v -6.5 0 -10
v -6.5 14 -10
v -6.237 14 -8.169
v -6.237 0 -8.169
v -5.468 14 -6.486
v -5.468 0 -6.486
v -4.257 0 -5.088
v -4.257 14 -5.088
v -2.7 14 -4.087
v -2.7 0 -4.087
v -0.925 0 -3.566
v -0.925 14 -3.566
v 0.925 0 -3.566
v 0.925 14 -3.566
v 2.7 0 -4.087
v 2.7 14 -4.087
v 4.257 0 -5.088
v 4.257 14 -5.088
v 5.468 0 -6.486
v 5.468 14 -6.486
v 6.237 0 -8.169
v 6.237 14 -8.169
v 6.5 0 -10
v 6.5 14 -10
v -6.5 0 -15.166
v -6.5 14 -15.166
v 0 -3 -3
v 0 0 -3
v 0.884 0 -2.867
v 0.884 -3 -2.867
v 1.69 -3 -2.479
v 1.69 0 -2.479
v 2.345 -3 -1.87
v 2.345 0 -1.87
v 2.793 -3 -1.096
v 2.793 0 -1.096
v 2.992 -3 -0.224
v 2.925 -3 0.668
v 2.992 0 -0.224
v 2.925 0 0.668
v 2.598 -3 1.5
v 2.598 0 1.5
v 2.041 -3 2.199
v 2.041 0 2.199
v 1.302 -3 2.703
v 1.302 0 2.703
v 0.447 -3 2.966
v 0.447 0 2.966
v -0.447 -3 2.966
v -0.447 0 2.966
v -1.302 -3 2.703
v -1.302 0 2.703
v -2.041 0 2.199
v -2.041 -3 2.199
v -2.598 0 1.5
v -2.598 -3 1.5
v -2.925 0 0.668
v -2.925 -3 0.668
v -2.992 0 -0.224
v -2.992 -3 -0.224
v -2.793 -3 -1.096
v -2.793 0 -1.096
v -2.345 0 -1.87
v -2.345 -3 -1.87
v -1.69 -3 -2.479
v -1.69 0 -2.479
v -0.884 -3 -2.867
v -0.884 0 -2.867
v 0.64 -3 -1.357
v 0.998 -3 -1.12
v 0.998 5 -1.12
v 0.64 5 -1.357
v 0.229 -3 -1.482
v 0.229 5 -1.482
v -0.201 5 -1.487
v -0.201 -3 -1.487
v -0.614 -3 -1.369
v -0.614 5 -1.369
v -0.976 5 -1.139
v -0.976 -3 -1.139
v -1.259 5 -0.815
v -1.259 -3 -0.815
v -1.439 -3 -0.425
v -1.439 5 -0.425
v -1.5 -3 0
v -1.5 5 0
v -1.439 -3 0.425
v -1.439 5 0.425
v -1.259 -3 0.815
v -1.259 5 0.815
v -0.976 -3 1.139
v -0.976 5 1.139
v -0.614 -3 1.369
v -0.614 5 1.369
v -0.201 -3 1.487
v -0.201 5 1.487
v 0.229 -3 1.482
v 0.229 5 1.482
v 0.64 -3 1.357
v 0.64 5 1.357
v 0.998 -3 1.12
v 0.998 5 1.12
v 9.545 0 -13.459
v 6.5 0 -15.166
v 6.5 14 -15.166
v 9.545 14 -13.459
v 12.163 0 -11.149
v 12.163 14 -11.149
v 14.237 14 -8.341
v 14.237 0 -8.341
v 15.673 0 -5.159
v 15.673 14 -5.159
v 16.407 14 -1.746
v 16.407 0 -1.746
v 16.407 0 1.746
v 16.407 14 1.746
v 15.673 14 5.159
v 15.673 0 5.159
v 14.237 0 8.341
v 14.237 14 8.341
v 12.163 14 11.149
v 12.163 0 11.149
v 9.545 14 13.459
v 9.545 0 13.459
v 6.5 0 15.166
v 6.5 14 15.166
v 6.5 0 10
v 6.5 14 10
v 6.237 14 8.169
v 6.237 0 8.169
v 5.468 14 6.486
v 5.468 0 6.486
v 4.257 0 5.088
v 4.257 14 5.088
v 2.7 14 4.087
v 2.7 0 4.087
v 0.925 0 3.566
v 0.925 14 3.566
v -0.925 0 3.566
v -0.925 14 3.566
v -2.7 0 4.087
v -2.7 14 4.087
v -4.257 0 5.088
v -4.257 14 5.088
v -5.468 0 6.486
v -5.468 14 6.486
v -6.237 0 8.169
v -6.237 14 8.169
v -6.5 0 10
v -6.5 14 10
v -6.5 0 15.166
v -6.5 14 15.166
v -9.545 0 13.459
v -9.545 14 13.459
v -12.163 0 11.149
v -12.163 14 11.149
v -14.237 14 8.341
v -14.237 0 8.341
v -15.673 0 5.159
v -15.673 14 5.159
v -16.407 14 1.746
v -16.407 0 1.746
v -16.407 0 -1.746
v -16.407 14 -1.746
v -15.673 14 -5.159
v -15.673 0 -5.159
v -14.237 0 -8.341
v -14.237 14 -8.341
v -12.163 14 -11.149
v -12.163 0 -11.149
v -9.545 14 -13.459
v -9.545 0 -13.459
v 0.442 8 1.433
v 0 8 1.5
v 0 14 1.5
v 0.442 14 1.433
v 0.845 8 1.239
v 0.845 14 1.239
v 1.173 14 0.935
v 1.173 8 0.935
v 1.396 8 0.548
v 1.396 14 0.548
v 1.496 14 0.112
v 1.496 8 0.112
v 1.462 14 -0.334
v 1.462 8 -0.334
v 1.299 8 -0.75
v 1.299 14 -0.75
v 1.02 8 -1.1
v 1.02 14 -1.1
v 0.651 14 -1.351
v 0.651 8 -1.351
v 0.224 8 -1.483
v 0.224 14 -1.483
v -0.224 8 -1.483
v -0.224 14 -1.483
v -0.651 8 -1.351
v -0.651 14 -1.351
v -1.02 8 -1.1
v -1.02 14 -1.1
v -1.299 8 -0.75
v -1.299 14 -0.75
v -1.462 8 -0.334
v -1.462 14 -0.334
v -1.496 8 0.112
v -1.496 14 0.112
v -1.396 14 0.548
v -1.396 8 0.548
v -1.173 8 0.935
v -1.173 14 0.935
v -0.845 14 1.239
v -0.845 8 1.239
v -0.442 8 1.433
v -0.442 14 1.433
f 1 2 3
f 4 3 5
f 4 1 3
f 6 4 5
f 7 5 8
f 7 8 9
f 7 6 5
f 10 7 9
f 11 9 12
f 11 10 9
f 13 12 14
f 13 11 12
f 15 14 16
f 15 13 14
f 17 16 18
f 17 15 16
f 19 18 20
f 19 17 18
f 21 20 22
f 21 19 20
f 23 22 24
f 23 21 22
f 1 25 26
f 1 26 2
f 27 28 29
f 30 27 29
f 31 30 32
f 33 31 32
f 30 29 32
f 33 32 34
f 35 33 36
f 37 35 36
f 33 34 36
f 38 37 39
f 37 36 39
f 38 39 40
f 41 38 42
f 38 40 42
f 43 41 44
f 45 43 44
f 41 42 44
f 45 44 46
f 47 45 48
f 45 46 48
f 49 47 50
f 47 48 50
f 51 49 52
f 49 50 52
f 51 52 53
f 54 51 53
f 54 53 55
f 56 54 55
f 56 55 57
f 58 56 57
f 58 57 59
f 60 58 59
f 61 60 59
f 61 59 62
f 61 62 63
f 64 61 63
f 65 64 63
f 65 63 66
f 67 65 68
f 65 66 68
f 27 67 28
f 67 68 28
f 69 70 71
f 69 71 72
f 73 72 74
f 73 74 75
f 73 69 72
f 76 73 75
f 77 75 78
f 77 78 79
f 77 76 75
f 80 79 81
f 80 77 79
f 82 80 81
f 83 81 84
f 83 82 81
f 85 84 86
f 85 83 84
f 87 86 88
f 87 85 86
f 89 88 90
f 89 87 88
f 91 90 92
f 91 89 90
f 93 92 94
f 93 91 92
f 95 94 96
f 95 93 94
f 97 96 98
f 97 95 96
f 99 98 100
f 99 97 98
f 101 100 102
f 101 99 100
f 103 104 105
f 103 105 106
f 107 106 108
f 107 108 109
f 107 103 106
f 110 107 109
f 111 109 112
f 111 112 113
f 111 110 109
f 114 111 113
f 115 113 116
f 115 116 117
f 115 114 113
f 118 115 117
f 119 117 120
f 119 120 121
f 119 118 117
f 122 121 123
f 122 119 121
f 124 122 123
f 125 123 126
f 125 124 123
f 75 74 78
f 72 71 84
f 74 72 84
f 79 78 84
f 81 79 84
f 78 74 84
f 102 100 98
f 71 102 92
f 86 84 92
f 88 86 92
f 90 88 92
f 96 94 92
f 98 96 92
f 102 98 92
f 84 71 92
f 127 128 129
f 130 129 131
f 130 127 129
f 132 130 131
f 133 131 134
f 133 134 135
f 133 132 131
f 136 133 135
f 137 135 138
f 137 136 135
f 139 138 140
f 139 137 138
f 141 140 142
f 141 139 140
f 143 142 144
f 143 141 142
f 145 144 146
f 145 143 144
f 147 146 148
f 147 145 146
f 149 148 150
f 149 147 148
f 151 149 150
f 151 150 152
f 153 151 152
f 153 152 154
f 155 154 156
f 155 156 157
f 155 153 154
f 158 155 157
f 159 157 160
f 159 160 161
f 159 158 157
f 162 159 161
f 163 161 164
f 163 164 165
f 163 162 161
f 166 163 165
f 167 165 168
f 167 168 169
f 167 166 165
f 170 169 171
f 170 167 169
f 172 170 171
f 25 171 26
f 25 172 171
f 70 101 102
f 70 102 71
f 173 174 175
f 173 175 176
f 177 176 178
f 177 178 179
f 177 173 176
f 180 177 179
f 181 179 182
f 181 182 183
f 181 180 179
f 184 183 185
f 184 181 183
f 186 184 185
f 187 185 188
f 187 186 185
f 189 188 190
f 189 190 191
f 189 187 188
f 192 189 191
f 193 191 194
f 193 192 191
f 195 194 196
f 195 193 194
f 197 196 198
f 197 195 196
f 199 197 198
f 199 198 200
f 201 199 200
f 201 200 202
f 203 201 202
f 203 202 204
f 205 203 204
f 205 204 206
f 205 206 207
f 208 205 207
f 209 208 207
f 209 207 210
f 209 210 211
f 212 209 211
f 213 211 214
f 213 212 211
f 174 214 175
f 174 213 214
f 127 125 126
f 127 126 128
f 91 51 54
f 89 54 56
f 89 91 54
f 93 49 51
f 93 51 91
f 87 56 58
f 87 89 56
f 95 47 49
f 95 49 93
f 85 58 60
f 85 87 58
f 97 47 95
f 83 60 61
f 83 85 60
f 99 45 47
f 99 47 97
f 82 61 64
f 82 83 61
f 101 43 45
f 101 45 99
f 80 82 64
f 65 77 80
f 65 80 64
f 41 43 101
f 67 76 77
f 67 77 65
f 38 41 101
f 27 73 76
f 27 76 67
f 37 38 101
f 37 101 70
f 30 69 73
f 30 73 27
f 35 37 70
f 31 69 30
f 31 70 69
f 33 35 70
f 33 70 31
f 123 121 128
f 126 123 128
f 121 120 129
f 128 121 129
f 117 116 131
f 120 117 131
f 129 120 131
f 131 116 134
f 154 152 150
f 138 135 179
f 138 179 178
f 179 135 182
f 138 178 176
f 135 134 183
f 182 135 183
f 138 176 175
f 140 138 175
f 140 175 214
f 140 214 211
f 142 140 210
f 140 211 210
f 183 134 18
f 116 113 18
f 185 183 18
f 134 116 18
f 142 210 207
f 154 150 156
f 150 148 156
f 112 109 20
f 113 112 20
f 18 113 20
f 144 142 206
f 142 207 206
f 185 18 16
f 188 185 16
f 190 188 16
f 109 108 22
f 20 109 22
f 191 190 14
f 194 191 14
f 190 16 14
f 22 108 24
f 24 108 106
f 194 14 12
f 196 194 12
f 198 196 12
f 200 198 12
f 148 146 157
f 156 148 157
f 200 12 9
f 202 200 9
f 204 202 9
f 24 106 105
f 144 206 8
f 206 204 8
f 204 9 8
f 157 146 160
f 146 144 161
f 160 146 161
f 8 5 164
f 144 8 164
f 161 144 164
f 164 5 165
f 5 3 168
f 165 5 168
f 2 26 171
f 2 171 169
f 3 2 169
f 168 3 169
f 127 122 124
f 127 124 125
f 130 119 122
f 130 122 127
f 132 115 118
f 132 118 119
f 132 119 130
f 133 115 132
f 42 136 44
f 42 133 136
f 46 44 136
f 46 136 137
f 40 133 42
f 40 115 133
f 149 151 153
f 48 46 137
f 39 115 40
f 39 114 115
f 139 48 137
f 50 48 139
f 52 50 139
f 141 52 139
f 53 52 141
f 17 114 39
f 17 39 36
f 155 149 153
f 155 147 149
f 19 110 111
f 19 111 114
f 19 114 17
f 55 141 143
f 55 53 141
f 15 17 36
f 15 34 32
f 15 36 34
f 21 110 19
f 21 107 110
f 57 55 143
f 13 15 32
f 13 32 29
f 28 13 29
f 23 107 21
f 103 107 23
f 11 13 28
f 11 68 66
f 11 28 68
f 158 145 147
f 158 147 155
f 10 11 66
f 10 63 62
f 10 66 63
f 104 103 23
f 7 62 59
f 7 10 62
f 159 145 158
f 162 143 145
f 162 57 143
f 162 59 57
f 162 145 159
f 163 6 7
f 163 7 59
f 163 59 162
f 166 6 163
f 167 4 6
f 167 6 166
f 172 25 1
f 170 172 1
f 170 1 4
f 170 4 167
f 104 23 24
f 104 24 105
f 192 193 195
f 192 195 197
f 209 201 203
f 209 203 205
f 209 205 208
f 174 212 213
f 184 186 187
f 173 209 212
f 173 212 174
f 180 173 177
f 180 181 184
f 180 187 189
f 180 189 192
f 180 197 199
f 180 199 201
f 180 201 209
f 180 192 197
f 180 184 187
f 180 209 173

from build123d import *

# Parameters (mm, degrees)
BOSS_EXTRUDE1_DEPTH = 14
SKETCH2_R           = 3
BOSS_EXTRUDE2_DEPTH = 3
CUT_EXTRUDE1_DEPTH  = 8
CUT_EXTRUDE2_START  = -6
SKETCH4_R           = 1.5
CUT_EXTRUDE2_DEPTH  = 6


with BuildPart() as part:
    # Sketch1 → Boss-Extrude1 (new body)
    with BuildSketch(Plane(origin=(0, 0, 0), x_dir=(1, 0, 0), z_dir=(0, 1, 0))):
        with BuildLine():
            Line((-6.5, 15.165750888), (-6.5, 10))
            ThreePointArc((-6.5, 10), (0, 3.5), (6.5, 10))
            Line((6.5, 10), (6.5, 15.165750888))
            ThreePointArc((6.5, 15.165750888), (16.5, 0), (6.5, -15.165750888))
            Line((6.5, -15.165750888), (6.5, -10))
            ThreePointArc((6.5, -10), (0, -3.5), (-6.5, -10))
            Line((-6.5, -10), (-6.5, -15.165750888))
            ThreePointArc((-6.5, -15.165750888), (-16.5, 0), (-6.5, 15.165750888))
        make_face()
    extrude(amount=BOSS_EXTRUDE1_DEPTH)

    # Sketch2 → Boss-Extrude2 (add)
    with BuildSketch(Plane.XZ):
        Circle(SKETCH2_R)
    extrude(amount=BOSS_EXTRUDE2_DEPTH)

    # Sketch3 → Cut-Extrude1 (cut)
    with BuildSketch(Plane.XZ.offset(3)):
        with BuildLine():
            Line((0.997797575, 1.12), (0.997797575, -1.12))
            ThreePointArc((0.997797575, -1.12), (-1.5, 0), (0.997797575, 1.12))
        make_face()
    extrude(amount=-CUT_EXTRUDE1_DEPTH, mode=Mode.SUBTRACT)

    # Sketch4 → Cut-Extrude2 (cut)
    with BuildSketch(Plane(origin=(0, 14, 0), x_dir=(1, 0, 0), z_dir=(0, 1, 0)).offset(CUT_EXTRUDE2_START)):
        Circle(SKETCH4_R)
    extrude(amount=CUT_EXTRUDE2_DEPTH, mode=Mode.SUBTRACT)


solid = part.part
